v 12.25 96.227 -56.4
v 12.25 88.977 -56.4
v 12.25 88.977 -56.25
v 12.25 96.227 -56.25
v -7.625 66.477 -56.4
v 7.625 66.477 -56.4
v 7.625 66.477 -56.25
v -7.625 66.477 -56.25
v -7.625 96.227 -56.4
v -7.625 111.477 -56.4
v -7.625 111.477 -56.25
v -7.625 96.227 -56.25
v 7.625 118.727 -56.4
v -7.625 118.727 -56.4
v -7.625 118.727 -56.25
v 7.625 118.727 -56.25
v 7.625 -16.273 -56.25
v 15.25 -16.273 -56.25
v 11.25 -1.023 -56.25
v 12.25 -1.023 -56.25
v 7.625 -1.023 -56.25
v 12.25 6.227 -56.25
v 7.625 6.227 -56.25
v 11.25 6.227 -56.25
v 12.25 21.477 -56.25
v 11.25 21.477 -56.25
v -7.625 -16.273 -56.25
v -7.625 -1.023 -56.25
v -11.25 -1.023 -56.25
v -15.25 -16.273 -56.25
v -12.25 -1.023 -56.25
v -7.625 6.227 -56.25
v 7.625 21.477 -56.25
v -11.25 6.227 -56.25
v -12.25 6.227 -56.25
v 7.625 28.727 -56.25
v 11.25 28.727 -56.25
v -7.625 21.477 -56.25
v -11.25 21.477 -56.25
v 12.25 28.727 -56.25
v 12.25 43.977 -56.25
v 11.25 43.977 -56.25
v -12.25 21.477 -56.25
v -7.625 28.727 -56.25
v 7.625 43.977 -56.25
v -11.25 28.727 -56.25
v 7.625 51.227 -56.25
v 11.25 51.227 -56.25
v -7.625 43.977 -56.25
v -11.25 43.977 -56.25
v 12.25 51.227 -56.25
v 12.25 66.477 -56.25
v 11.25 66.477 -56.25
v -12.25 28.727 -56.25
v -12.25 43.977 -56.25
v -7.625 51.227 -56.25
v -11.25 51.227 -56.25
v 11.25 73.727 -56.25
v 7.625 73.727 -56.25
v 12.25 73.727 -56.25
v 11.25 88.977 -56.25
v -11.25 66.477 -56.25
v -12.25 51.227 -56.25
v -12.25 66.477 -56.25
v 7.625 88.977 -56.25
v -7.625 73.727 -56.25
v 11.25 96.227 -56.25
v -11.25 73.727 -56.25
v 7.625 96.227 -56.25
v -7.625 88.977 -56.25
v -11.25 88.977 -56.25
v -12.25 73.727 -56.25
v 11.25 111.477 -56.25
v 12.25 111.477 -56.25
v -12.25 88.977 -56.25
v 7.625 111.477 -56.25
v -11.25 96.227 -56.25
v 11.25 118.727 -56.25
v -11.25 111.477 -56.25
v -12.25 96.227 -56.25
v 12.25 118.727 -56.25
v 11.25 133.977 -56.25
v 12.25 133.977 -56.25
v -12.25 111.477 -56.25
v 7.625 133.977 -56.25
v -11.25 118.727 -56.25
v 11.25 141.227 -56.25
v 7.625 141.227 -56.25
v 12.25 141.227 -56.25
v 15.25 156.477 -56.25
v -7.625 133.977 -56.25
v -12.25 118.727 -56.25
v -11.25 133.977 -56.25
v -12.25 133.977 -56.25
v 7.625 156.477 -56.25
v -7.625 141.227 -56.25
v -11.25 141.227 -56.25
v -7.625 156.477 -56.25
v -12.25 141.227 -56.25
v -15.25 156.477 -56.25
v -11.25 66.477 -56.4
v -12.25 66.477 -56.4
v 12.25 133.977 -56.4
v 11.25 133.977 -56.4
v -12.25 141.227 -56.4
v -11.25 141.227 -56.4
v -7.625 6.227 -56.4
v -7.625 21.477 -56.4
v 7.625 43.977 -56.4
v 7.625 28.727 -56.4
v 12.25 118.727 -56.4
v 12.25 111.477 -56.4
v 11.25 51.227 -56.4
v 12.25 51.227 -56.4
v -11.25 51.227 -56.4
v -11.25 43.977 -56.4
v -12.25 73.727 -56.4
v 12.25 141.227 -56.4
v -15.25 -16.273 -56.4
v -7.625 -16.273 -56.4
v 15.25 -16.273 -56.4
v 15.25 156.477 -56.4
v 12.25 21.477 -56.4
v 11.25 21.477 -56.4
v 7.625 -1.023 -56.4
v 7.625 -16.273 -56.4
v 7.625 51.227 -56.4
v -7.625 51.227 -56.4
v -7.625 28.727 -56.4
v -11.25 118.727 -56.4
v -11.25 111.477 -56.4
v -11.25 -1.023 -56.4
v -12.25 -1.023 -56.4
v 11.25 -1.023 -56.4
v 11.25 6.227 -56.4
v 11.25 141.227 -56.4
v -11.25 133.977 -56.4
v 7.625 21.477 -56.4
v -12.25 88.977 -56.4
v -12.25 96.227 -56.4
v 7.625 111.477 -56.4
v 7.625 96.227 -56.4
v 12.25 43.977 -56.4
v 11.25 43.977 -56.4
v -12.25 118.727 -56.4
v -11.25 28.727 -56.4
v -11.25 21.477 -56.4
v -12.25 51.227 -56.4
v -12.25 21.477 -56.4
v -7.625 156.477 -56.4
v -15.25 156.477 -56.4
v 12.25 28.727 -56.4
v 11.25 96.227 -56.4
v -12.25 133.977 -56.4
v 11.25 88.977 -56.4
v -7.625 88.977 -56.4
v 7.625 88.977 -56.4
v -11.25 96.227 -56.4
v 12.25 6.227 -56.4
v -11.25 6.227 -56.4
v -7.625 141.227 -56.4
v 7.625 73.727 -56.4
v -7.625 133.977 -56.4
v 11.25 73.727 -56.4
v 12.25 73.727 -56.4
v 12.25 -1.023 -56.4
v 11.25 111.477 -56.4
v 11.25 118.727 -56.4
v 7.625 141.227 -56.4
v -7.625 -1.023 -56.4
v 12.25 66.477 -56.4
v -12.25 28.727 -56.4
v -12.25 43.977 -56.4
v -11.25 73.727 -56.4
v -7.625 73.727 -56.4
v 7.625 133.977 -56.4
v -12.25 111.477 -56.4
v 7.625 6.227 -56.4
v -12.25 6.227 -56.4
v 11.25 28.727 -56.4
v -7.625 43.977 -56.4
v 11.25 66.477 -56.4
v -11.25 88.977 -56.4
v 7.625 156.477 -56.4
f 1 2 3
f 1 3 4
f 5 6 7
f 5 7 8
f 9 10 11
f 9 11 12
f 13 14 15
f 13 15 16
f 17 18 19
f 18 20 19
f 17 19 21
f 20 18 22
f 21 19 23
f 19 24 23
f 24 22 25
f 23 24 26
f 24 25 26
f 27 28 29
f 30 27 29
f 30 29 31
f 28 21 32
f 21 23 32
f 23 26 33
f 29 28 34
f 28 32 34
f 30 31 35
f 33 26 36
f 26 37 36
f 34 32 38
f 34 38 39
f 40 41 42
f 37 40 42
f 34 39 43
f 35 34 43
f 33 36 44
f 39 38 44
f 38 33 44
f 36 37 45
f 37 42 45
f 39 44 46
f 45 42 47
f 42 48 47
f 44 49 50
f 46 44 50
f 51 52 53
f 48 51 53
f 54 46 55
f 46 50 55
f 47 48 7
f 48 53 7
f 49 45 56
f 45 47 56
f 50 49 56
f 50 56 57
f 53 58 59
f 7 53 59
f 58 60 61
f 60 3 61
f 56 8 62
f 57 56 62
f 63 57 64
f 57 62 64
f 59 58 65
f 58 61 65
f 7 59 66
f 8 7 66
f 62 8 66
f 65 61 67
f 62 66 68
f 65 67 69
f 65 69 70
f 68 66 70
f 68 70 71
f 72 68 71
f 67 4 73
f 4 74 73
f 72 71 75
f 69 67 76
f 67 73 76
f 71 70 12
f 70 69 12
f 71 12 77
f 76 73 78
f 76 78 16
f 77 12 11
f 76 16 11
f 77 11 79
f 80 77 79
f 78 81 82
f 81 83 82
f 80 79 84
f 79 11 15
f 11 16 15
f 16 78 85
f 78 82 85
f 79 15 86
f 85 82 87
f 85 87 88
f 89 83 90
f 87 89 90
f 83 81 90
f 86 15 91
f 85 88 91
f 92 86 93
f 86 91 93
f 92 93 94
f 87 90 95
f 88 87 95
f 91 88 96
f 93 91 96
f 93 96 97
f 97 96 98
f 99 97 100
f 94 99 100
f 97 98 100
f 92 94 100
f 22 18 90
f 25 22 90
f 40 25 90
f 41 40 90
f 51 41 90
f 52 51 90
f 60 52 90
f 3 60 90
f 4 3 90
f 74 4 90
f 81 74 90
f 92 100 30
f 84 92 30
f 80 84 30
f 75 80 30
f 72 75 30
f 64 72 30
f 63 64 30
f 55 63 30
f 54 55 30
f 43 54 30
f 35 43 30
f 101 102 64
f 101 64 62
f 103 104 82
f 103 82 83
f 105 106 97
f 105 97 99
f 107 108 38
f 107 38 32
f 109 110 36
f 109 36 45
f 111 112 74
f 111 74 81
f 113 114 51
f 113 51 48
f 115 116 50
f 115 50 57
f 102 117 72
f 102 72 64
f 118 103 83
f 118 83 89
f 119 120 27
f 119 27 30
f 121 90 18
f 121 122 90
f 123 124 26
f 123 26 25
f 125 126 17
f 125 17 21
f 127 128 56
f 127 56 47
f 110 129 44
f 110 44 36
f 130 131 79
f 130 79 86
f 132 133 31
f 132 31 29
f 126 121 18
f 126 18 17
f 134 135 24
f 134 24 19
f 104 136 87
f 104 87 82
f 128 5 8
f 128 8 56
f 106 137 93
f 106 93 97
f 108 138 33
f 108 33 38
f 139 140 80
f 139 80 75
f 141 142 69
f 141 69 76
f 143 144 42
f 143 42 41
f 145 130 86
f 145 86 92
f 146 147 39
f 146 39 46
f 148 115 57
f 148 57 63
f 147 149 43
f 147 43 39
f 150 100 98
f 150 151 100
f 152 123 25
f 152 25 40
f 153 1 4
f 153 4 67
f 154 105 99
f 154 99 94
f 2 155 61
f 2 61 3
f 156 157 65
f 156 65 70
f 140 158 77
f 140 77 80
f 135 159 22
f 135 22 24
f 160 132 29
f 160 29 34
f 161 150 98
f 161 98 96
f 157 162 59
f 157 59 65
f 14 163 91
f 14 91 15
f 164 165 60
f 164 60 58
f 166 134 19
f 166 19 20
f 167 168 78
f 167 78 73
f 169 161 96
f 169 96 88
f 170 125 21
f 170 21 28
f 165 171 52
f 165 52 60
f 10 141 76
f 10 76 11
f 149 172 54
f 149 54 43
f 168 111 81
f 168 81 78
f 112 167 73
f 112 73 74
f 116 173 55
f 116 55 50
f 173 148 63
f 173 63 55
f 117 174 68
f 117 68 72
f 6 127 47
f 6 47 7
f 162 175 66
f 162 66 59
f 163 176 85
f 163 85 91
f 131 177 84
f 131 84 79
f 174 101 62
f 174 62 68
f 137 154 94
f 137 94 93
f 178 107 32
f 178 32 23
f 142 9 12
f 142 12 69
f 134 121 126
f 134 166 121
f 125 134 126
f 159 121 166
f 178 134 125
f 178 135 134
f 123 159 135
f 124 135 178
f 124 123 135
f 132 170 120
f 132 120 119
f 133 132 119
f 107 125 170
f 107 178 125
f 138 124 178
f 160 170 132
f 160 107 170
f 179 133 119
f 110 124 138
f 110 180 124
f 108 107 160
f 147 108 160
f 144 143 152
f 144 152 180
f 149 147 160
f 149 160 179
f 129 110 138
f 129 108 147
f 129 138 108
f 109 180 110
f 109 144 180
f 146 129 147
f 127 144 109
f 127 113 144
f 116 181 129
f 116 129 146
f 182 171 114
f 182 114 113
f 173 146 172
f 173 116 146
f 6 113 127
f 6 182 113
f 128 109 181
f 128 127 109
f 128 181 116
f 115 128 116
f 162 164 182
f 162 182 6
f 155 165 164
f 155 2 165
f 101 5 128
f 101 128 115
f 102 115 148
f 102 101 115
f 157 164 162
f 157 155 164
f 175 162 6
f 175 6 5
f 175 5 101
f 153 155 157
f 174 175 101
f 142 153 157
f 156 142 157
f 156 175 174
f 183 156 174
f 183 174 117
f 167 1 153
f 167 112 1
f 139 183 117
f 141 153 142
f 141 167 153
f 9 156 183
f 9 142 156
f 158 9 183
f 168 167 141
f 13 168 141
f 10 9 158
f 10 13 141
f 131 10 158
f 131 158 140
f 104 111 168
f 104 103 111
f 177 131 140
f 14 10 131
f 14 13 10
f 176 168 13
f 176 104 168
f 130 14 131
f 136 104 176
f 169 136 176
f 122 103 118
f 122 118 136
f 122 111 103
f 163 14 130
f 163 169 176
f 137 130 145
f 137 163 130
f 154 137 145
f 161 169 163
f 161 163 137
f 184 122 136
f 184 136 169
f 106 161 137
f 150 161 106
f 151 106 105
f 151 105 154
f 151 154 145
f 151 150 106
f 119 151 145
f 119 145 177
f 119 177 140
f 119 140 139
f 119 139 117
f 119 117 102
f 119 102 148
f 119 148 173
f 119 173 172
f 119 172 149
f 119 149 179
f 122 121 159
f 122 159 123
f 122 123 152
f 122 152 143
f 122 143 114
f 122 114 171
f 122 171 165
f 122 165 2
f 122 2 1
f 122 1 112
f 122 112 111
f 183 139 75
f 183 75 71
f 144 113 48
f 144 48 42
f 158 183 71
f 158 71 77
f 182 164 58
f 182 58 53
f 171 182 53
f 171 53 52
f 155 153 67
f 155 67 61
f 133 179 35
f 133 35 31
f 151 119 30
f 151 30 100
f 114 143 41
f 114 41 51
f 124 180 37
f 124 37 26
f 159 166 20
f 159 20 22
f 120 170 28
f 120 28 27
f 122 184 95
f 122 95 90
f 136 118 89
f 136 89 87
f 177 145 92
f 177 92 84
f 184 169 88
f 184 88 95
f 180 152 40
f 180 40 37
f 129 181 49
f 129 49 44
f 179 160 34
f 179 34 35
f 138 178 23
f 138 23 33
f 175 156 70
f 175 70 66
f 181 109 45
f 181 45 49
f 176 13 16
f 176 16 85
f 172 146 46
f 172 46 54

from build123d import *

# Parameters (mm, degrees)
PAD024_DEPTH = 0.15
PAD025_DEPTH = 0.15
PAD026_DEPTH = 0.15
PAD027_DEPTH = 0.15
PAD028_DEPTH = 0.15
PAD029_DEPTH = 0.15
BOX011_W     = 32
BOX011_H     = 10
BOX011_DEPTH = 10
PAD030_DEPTH = 0.15
PAD023_DEPTH = 0.15


with BuildPart() as battery_connector008:
    # Sketch038 → Pad024 (new body)
    with BuildSketch(Plane.XY):
        Polygon((-15.25, -15), (-15.25, 7.5), (-12.25, 7.5), (-12.25, 0.25), (-11.25, 0.25), (-11.25, 7.5), (11.25, 7.5), (11.25, 0.25), (12.25, 0.25), (12.25, 7.5), (15.25, 7.5), (15.25, -15), (7.625, -15), (7.625, 0.25), (-7.625, 0.25), (-7.625, -15), align=None)
    extrude(amount=PAD024_DEPTH)


with BuildPart() as battery_connector008_1:
    # Body032 placement: moved
    add(battery_connector008.part.moved(Location((0, 22.5, 0))))


with BuildPart() as battery_connector009:
    # Sketch039 → Pad025 (new body)
    with BuildSketch(Plane.XY):
        Polygon((-15.25, -15), (-15.25, 7.5), (-12.25, 7.5), (-12.25, 0.25), (-11.25, 0.25), (-11.25, 7.5), (11.25, 7.5), (11.25, 0.25), (12.25, 0.25), (12.25, 7.5), (15.25, 7.5), (15.25, -15), (7.625, -15), (7.625, 0.25), (-7.625, 0.25), (-7.625, -15), align=None)
    extrude(amount=PAD025_DEPTH)


with BuildPart() as battery_connector009_1:
    # Body033 placement: moved
    add(battery_connector009.part.moved(Location((0, 45, 0))))


with BuildPart() as battery_connector010:
    # Sketch040 → Pad026 (new body)
    with BuildSketch(Plane.XY):
        Polygon((-15.25, -15), (-15.25, 7.5), (-12.25, 7.5), (-12.25, 0.25), (-11.25, 0.25), (-11.25, 7.5), (11.25, 7.5), (11.25, 0.25), (12.25, 0.25), (12.25, 7.5), (15.25, 7.5), (15.25, -15), (7.625, -15), (7.625, 0.25), (-7.625, 0.25), (-7.625, -15), align=None)
    extrude(amount=PAD026_DEPTH)


with BuildPart() as battery_connector010_1:
    # Body034 placement: moved
    add(battery_connector010.part.moved(Location((0, 67.5, 0))))


with BuildPart() as battery_connector011:
    # Sketch041 → Pad027 (new body)
    with BuildSketch(Plane.XY):
        Polygon((-15.25, -15), (-15.25, 7.5), (-12.25, 7.5), (-12.25, 0.25), (-11.25, 0.25), (-11.25, 7.5), (11.25, 7.5), (11.25, 0.25), (12.25, 0.25), (12.25, 7.5), (15.25, 7.5), (15.25, -15), (7.625, -15), (7.625, 0.25), (-7.625, 0.25), (-7.625, -15), align=None)
    extrude(amount=PAD027_DEPTH)


with BuildPart() as battery_connector011_1:
    # Body035 placement: moved
    add(battery_connector011.part.moved(Location((0, 90, 0))))


with BuildPart() as battery_connector012:
    # Sketch042 → Pad028 (new body)
    with BuildSketch(Plane.XY):
        Polygon((-15.25, -15), (-15.25, 7.5), (-12.25, 7.5), (-12.25, 0.25), (-11.25, 0.25), (-11.25, 7.5), (11.25, 7.5), (11.25, 0.25), (12.25, 0.25), (12.25, 7.5), (15.25, 7.5), (15.25, -15), (7.625, -15), (7.625, 0.25), (-7.625, 0.25), (-7.625, -15), align=None)
    extrude(amount=PAD028_DEPTH)


with BuildPart() as battery_connector012_1:
    # Body036 placement: moved
    add(battery_connector012.part.moved(Location((0, 112.5, 0))))


with BuildPart() as battery_connector013:
    # Sketch043 → Pad029 (new body)
    with BuildSketch(Plane.XY):
        Polygon((-15.25, -15), (-15.25, 7.5), (-12.25, 7.5), (-12.25, 0.25), (-11.25, 0.25), (-11.25, 7.5), (11.25, 7.5), (11.25, 0.25), (12.25, 0.25), (12.25, 7.5), (15.25, 7.5), (15.25, -15), (7.625, -15), (7.625, 0.25), (-7.625, 0.25), (-7.625, -15), align=None)
    extrude(amount=PAD029_DEPTH)


with BuildPart() as battery_connector013_1:
    # Body037 placement: moved
    add(battery_connector013.part.moved(Location((0, 135, 0))))


with BuildPart() as cube011:
    # Box011 → Box011 (new body)
    with BuildSketch(Plane(origin=(-16, 157.75, -5), x_dir=(1, 0, 0), z_dir=(0, 0, 1))):
        with Locations((16, 5)):
            Rectangle(BOX011_W, BOX011_H)
    extrude(amount=BOX011_DEPTH)


with BuildPart() as cut004:
    # Sketch044 → Pad030 (new body)
    with BuildSketch(Plane.XY):
        Polygon((-15.25, -15), (-15.25, 7.5), (-12.25, 7.5), (-12.25, 0.25), (-11.25, 0.25), (-11.25, 7.5), (11.25, 7.5), (11.25, 0.25), (12.25, 0.25), (12.25, 7.5), (15.25, 7.5), (15.25, -15), (7.625, -15), (7.625, 0.25), (-7.625, 0.25), (-7.625, -15), align=None)
    extrude(amount=PAD030_DEPTH)


with BuildPart() as cut004_1:
    # Body038 placement: moved
    add(cut004.part.moved(Location((0, 157.5, 0))))

    # Cut004: cut Cube011
    add(cube011.part, mode=Mode.SUBTRACT)


with BuildPart() as batteryconnector:
    # Sketch037 → Pad023 (new body)
    with BuildSketch(Plane.XY):
        Polygon((-15.25, -15), (-15.25, 7.5), (-12.25, 7.5), (-12.25, 0.25), (-11.25, 0.25), (-11.25, 7.5), (11.25, 7.5), (11.25, 0.25), (12.25, 0.25), (12.25, 7.5), (15.25, 7.5), (15.25, -15), (7.625, -15), (7.625, 0.25), (-7.625, 0.25), (-7.625, -15), align=None)
    extrude(amount=PAD023_DEPTH)

    # Fusion: union Battery Connector008, Battery Connector009, Battery Connector010, Battery Connector011, Battery Connector012, Battery Connector013, Cut004
    add(battery_connector008_1.part)
    add(battery_connector009_1.part)
    add(battery_connector010_1.part)
    add(battery_connector011_1.part)
    add(battery_connector012_1.part)
    add(battery_connector013_1.part)
    add(cut004_1.part)


with BuildPart() as batteryconnector_1:
    # refine placement: moved
    add(batteryconnector.part.moved(Location((0, -1.273, -56.4))))


solid = batteryconnector_1.part
